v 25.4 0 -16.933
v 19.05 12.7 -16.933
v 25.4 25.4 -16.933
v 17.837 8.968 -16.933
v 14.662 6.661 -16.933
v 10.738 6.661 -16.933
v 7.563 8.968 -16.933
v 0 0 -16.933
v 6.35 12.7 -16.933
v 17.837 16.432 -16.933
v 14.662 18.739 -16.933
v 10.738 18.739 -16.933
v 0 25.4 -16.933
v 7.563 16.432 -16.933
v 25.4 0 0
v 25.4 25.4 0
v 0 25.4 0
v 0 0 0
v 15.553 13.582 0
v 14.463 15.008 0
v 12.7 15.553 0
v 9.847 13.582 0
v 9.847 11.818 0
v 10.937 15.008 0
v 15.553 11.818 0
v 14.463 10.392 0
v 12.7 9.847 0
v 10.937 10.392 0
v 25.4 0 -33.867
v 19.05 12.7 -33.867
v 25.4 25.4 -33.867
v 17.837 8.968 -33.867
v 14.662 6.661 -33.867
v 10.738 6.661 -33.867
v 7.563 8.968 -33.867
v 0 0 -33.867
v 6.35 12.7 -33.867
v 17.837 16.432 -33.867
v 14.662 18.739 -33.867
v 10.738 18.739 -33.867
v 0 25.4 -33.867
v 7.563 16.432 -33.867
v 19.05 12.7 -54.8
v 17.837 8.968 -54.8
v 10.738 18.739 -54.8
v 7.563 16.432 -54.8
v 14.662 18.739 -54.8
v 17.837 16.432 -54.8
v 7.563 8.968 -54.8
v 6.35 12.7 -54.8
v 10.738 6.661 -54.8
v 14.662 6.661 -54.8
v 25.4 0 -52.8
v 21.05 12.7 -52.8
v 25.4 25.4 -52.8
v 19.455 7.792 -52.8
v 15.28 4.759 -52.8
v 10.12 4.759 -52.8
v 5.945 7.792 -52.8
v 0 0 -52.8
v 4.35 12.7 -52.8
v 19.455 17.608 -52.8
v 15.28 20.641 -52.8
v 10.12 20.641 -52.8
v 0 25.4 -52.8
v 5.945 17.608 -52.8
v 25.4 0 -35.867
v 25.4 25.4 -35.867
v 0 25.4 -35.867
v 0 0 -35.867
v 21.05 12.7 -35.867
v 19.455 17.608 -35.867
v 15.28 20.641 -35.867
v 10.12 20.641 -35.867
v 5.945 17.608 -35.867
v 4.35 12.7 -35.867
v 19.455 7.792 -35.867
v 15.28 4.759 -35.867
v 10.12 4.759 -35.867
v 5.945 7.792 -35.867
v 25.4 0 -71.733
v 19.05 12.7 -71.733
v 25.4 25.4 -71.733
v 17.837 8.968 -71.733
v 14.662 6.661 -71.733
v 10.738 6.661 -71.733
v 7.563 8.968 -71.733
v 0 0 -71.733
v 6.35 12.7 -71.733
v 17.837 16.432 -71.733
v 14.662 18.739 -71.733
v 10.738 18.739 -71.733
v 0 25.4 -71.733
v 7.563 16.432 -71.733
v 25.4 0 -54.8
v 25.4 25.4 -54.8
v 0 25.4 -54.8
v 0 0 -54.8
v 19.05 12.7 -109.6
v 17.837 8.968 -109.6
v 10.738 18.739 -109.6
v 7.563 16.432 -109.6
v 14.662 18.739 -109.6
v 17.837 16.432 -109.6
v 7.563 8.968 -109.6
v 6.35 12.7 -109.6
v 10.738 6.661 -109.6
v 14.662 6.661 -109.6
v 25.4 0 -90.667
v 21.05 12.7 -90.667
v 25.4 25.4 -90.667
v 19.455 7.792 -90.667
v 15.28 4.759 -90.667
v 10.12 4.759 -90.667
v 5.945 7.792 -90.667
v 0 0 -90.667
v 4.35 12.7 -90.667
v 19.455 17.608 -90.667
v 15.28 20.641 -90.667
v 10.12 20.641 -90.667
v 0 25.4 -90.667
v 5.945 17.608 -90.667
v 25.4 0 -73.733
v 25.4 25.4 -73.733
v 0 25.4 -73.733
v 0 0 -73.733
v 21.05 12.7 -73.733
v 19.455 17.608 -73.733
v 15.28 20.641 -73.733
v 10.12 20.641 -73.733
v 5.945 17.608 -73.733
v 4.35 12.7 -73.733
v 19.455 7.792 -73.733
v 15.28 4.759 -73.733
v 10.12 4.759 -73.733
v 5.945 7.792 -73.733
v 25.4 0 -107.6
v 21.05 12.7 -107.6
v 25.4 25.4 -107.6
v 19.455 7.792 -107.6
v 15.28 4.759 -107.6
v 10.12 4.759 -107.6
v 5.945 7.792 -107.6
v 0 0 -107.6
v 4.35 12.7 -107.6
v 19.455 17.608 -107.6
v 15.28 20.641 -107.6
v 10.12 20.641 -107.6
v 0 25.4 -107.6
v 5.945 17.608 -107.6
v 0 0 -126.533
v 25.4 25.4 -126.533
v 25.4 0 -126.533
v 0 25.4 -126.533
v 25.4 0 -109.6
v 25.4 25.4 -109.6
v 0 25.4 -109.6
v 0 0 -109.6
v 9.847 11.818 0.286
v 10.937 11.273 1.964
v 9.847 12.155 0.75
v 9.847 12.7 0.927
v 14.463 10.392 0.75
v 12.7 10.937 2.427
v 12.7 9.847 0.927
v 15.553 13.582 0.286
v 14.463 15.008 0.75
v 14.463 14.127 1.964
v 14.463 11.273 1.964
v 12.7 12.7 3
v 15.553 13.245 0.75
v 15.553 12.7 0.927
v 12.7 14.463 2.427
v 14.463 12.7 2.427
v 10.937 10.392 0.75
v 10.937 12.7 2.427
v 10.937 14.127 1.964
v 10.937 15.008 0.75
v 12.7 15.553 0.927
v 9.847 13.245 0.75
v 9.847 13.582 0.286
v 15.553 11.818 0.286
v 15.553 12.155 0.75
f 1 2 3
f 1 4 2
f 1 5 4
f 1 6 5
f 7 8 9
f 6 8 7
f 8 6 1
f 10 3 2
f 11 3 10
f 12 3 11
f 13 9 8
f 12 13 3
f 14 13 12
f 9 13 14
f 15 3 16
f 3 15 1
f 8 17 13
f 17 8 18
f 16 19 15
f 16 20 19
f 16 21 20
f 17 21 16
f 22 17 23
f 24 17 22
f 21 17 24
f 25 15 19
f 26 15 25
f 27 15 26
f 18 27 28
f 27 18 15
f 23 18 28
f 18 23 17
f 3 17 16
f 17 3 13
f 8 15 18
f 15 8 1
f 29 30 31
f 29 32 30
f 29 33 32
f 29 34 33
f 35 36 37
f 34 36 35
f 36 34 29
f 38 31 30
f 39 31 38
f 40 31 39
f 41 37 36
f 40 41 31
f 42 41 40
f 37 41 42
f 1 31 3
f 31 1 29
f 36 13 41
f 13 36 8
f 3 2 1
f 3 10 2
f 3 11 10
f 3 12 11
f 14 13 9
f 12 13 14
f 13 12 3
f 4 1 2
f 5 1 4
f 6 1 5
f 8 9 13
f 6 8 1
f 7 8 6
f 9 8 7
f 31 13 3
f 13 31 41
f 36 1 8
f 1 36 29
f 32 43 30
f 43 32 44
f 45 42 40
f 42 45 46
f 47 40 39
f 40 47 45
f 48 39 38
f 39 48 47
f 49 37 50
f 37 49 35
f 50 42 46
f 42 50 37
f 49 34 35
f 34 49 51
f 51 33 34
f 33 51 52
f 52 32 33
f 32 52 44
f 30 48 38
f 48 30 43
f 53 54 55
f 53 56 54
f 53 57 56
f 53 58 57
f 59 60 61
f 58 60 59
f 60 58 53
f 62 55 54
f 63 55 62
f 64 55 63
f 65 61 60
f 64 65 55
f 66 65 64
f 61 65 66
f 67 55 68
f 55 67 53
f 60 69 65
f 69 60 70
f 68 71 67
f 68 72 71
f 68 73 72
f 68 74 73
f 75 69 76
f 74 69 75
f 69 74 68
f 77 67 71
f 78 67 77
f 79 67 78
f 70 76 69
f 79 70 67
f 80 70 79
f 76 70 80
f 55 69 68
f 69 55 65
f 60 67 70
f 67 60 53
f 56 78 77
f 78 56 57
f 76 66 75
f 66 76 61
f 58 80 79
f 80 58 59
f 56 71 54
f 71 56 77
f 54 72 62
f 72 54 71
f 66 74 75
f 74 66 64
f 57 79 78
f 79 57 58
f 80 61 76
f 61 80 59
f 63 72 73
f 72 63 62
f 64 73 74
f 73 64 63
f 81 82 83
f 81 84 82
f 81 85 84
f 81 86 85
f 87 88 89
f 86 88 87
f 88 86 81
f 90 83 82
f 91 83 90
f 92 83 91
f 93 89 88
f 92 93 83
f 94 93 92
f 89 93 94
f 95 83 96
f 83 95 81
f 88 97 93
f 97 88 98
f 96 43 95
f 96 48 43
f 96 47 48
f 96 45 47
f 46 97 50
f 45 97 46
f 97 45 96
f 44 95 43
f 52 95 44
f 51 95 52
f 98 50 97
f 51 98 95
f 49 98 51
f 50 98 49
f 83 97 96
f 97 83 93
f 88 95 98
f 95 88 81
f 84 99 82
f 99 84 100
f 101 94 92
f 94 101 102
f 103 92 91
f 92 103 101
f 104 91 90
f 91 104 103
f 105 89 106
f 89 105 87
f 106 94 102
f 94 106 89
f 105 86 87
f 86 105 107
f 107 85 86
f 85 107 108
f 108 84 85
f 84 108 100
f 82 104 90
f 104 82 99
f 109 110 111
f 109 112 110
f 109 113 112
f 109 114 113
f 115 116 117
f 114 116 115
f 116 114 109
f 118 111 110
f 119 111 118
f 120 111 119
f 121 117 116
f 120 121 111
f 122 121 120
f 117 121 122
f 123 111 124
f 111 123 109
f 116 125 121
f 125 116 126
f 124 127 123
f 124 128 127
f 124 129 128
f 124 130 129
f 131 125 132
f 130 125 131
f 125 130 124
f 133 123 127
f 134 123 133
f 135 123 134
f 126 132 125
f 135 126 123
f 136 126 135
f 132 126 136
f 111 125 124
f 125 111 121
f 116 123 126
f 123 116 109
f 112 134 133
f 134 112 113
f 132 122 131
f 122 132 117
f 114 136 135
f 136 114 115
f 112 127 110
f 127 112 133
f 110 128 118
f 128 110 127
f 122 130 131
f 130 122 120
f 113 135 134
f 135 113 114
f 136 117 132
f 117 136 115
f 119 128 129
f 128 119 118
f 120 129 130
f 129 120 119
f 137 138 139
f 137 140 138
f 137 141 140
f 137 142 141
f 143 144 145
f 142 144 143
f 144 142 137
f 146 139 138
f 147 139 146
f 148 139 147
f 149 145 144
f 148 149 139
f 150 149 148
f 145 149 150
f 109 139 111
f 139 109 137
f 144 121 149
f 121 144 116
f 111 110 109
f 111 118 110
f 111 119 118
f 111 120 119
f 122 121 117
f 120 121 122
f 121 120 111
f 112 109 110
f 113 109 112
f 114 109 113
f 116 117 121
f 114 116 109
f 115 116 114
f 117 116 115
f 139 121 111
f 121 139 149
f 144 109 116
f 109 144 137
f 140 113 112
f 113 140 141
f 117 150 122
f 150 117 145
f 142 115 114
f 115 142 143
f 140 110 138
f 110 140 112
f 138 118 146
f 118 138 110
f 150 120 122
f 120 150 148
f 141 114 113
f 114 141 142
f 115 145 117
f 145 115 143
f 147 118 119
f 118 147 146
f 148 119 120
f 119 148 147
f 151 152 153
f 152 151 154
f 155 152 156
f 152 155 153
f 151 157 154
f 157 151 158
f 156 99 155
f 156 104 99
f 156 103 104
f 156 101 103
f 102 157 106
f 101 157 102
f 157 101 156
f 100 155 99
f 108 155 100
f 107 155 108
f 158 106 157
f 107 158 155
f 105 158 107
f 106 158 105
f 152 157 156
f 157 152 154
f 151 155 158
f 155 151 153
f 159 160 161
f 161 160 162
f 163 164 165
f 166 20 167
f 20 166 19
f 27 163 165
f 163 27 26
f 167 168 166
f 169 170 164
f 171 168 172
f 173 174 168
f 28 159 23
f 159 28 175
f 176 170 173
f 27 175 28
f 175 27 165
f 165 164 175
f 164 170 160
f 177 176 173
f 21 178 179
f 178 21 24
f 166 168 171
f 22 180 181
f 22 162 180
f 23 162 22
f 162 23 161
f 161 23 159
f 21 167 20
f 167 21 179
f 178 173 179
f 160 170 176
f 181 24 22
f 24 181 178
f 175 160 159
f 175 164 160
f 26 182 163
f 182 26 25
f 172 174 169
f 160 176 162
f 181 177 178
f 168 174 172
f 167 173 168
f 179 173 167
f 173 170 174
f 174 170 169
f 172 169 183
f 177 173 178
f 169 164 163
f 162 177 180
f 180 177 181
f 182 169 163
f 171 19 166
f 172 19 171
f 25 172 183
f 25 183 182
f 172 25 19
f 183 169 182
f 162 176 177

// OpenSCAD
//Word Cube Generator
//Inspired by Word Cubes by MrKindergarten
//http://www.thingiverse.com/thing:1554507


/*[Sentance Pattern]*/
//f = doesn't spin, l = spins, must start and end with f
pattern = ["ff","l","f","ll","f"];
/*[Cube Features]*/
size = 25.4;
gap = 2;
topBump = true;//[true,false]
/*[Braille Text Size]*/
//percentage of cube
fontSize = .75;//[.05:.05:1]

rotate([0,90,0]){
  union(){
    if(topBump)
      translate([0,size/2,size/2])
        sphere(3);
    makeCubes();
  }
}
module makeCubes(step = 0)
{
  if(step < len(pattern)-1){
    for(i=[0:len(pattern[step])-1]){
      translate([size*2/3,0,0]*i)
        makeCube(hollow=len(search("l",pattern[step])));
    }
    translate([size*2/3*len(pattern[step])+gap,0,0])
      makeCubes(step = step +1);
  }
  else
    makeCube(flag = false);
}

module makeCube(hollow = false, flag = true)
{
  union(){
    difference(){
      cube([size*2/3,size,size]);
      if(hollow)
        translate([0,size/2,size/2])
          rotate([0,90,0])
            cylinder(r = size/4+2, h = size+gap*2);
    }
    if(flag)
      translate([0,size/2,size/2])
        rotate([0,90,0])
          cylinder(r = size/4, h = size*2/3+gap*2);
  }
}
//All the braille text logic below...

braille_conversion_db =[
["CAPS",  [6]          ],
["a",   [1]            ],
["b",   [1, 2]         ],
["c",   [1, 4]         ],
["d",   [1, 4, 5]      ],
["e",   [1, 5]         ],
["f",   [1, 2, 4]      ],
["g",   [1, 2, 4, 5]   ],
["h",   [1, 2, 5]      ],
["i",   [2, 4]         ],
["j",   [2, 4, 5]      ],
["k",   [1, 3]         ],
["l",   [1, 2, 3]      ],
["m",   [1, 3, 4]      ],
["n",   [1, 3, 4, 5]   ],
["o",   [1, 3, 5,]     ],
["p",   [1, 2, 3, 4]   ],
["q",   [1, 2, 3, 4, 5]],
["r",   [1, 2, 3, 5]   ],
["s",   [2, 3, 4,]     ],
["t",   [2, 3, 4, 5]   ],
["u",   [1, 3, 6,]     ],
["v",   [1, 2, 3, 6]   ],
["w",   [2, 4, 5, 6]   ],
["x",   [1, 3, 4, 6]   ],
["y",   [1, 3, 4, 5, 6]],
["z",   [1, 3, 5, 6]   ],
["!",   [2, 3, 5,]     ],
[",",   [2]            ],
["-",   [3, 6]         ],
[".",   [2, 5, 6]      ],
["?",   [2, 3, 6]      ],
["#",   [3, 4, 5, 6]   ],
["0",   [2, 4, 5]      ],
["1",   [1]            ],
["2",   [1, 2]         ],
["3",   [1, 4]         ],
["4",   [1, 4, 5]      ],
["5",   [1, 5]         ],
["6",   [1, 2, 4]      ],
["7",   [1, 2, 4, 5]   ],
["8",   [1, 2, 5]      ],
["9",   [2, 4]         ]
]; 
$fn = 10;
module drawDot(pos = 0)
{
  if(pos == 1)
    translate([-1.5,3,0])
      sphere(center = true);
  else if(pos == 2)
    translate([-1.5,0,0])
      sphere(center = true);
  else if(pos == 3)
    translate([-1.5,-3,0])
      sphere(center = true);
  else if(pos == 4)
    translate([1.5,3,0])
      sphere(center = true);
  else if(pos == 5)
    translate([1.5,0,0])
      sphere(center = true);
  else if(pos == 6)
    translate([1.5,-3,0])
      sphere(center = true);
}
module brailConversion(char = " "){
  temp = search(char, braille_conversion_db)[0];
  for(dot = braille_conversion_db[temp][1]){
    drawDot(dot);
  }
}
